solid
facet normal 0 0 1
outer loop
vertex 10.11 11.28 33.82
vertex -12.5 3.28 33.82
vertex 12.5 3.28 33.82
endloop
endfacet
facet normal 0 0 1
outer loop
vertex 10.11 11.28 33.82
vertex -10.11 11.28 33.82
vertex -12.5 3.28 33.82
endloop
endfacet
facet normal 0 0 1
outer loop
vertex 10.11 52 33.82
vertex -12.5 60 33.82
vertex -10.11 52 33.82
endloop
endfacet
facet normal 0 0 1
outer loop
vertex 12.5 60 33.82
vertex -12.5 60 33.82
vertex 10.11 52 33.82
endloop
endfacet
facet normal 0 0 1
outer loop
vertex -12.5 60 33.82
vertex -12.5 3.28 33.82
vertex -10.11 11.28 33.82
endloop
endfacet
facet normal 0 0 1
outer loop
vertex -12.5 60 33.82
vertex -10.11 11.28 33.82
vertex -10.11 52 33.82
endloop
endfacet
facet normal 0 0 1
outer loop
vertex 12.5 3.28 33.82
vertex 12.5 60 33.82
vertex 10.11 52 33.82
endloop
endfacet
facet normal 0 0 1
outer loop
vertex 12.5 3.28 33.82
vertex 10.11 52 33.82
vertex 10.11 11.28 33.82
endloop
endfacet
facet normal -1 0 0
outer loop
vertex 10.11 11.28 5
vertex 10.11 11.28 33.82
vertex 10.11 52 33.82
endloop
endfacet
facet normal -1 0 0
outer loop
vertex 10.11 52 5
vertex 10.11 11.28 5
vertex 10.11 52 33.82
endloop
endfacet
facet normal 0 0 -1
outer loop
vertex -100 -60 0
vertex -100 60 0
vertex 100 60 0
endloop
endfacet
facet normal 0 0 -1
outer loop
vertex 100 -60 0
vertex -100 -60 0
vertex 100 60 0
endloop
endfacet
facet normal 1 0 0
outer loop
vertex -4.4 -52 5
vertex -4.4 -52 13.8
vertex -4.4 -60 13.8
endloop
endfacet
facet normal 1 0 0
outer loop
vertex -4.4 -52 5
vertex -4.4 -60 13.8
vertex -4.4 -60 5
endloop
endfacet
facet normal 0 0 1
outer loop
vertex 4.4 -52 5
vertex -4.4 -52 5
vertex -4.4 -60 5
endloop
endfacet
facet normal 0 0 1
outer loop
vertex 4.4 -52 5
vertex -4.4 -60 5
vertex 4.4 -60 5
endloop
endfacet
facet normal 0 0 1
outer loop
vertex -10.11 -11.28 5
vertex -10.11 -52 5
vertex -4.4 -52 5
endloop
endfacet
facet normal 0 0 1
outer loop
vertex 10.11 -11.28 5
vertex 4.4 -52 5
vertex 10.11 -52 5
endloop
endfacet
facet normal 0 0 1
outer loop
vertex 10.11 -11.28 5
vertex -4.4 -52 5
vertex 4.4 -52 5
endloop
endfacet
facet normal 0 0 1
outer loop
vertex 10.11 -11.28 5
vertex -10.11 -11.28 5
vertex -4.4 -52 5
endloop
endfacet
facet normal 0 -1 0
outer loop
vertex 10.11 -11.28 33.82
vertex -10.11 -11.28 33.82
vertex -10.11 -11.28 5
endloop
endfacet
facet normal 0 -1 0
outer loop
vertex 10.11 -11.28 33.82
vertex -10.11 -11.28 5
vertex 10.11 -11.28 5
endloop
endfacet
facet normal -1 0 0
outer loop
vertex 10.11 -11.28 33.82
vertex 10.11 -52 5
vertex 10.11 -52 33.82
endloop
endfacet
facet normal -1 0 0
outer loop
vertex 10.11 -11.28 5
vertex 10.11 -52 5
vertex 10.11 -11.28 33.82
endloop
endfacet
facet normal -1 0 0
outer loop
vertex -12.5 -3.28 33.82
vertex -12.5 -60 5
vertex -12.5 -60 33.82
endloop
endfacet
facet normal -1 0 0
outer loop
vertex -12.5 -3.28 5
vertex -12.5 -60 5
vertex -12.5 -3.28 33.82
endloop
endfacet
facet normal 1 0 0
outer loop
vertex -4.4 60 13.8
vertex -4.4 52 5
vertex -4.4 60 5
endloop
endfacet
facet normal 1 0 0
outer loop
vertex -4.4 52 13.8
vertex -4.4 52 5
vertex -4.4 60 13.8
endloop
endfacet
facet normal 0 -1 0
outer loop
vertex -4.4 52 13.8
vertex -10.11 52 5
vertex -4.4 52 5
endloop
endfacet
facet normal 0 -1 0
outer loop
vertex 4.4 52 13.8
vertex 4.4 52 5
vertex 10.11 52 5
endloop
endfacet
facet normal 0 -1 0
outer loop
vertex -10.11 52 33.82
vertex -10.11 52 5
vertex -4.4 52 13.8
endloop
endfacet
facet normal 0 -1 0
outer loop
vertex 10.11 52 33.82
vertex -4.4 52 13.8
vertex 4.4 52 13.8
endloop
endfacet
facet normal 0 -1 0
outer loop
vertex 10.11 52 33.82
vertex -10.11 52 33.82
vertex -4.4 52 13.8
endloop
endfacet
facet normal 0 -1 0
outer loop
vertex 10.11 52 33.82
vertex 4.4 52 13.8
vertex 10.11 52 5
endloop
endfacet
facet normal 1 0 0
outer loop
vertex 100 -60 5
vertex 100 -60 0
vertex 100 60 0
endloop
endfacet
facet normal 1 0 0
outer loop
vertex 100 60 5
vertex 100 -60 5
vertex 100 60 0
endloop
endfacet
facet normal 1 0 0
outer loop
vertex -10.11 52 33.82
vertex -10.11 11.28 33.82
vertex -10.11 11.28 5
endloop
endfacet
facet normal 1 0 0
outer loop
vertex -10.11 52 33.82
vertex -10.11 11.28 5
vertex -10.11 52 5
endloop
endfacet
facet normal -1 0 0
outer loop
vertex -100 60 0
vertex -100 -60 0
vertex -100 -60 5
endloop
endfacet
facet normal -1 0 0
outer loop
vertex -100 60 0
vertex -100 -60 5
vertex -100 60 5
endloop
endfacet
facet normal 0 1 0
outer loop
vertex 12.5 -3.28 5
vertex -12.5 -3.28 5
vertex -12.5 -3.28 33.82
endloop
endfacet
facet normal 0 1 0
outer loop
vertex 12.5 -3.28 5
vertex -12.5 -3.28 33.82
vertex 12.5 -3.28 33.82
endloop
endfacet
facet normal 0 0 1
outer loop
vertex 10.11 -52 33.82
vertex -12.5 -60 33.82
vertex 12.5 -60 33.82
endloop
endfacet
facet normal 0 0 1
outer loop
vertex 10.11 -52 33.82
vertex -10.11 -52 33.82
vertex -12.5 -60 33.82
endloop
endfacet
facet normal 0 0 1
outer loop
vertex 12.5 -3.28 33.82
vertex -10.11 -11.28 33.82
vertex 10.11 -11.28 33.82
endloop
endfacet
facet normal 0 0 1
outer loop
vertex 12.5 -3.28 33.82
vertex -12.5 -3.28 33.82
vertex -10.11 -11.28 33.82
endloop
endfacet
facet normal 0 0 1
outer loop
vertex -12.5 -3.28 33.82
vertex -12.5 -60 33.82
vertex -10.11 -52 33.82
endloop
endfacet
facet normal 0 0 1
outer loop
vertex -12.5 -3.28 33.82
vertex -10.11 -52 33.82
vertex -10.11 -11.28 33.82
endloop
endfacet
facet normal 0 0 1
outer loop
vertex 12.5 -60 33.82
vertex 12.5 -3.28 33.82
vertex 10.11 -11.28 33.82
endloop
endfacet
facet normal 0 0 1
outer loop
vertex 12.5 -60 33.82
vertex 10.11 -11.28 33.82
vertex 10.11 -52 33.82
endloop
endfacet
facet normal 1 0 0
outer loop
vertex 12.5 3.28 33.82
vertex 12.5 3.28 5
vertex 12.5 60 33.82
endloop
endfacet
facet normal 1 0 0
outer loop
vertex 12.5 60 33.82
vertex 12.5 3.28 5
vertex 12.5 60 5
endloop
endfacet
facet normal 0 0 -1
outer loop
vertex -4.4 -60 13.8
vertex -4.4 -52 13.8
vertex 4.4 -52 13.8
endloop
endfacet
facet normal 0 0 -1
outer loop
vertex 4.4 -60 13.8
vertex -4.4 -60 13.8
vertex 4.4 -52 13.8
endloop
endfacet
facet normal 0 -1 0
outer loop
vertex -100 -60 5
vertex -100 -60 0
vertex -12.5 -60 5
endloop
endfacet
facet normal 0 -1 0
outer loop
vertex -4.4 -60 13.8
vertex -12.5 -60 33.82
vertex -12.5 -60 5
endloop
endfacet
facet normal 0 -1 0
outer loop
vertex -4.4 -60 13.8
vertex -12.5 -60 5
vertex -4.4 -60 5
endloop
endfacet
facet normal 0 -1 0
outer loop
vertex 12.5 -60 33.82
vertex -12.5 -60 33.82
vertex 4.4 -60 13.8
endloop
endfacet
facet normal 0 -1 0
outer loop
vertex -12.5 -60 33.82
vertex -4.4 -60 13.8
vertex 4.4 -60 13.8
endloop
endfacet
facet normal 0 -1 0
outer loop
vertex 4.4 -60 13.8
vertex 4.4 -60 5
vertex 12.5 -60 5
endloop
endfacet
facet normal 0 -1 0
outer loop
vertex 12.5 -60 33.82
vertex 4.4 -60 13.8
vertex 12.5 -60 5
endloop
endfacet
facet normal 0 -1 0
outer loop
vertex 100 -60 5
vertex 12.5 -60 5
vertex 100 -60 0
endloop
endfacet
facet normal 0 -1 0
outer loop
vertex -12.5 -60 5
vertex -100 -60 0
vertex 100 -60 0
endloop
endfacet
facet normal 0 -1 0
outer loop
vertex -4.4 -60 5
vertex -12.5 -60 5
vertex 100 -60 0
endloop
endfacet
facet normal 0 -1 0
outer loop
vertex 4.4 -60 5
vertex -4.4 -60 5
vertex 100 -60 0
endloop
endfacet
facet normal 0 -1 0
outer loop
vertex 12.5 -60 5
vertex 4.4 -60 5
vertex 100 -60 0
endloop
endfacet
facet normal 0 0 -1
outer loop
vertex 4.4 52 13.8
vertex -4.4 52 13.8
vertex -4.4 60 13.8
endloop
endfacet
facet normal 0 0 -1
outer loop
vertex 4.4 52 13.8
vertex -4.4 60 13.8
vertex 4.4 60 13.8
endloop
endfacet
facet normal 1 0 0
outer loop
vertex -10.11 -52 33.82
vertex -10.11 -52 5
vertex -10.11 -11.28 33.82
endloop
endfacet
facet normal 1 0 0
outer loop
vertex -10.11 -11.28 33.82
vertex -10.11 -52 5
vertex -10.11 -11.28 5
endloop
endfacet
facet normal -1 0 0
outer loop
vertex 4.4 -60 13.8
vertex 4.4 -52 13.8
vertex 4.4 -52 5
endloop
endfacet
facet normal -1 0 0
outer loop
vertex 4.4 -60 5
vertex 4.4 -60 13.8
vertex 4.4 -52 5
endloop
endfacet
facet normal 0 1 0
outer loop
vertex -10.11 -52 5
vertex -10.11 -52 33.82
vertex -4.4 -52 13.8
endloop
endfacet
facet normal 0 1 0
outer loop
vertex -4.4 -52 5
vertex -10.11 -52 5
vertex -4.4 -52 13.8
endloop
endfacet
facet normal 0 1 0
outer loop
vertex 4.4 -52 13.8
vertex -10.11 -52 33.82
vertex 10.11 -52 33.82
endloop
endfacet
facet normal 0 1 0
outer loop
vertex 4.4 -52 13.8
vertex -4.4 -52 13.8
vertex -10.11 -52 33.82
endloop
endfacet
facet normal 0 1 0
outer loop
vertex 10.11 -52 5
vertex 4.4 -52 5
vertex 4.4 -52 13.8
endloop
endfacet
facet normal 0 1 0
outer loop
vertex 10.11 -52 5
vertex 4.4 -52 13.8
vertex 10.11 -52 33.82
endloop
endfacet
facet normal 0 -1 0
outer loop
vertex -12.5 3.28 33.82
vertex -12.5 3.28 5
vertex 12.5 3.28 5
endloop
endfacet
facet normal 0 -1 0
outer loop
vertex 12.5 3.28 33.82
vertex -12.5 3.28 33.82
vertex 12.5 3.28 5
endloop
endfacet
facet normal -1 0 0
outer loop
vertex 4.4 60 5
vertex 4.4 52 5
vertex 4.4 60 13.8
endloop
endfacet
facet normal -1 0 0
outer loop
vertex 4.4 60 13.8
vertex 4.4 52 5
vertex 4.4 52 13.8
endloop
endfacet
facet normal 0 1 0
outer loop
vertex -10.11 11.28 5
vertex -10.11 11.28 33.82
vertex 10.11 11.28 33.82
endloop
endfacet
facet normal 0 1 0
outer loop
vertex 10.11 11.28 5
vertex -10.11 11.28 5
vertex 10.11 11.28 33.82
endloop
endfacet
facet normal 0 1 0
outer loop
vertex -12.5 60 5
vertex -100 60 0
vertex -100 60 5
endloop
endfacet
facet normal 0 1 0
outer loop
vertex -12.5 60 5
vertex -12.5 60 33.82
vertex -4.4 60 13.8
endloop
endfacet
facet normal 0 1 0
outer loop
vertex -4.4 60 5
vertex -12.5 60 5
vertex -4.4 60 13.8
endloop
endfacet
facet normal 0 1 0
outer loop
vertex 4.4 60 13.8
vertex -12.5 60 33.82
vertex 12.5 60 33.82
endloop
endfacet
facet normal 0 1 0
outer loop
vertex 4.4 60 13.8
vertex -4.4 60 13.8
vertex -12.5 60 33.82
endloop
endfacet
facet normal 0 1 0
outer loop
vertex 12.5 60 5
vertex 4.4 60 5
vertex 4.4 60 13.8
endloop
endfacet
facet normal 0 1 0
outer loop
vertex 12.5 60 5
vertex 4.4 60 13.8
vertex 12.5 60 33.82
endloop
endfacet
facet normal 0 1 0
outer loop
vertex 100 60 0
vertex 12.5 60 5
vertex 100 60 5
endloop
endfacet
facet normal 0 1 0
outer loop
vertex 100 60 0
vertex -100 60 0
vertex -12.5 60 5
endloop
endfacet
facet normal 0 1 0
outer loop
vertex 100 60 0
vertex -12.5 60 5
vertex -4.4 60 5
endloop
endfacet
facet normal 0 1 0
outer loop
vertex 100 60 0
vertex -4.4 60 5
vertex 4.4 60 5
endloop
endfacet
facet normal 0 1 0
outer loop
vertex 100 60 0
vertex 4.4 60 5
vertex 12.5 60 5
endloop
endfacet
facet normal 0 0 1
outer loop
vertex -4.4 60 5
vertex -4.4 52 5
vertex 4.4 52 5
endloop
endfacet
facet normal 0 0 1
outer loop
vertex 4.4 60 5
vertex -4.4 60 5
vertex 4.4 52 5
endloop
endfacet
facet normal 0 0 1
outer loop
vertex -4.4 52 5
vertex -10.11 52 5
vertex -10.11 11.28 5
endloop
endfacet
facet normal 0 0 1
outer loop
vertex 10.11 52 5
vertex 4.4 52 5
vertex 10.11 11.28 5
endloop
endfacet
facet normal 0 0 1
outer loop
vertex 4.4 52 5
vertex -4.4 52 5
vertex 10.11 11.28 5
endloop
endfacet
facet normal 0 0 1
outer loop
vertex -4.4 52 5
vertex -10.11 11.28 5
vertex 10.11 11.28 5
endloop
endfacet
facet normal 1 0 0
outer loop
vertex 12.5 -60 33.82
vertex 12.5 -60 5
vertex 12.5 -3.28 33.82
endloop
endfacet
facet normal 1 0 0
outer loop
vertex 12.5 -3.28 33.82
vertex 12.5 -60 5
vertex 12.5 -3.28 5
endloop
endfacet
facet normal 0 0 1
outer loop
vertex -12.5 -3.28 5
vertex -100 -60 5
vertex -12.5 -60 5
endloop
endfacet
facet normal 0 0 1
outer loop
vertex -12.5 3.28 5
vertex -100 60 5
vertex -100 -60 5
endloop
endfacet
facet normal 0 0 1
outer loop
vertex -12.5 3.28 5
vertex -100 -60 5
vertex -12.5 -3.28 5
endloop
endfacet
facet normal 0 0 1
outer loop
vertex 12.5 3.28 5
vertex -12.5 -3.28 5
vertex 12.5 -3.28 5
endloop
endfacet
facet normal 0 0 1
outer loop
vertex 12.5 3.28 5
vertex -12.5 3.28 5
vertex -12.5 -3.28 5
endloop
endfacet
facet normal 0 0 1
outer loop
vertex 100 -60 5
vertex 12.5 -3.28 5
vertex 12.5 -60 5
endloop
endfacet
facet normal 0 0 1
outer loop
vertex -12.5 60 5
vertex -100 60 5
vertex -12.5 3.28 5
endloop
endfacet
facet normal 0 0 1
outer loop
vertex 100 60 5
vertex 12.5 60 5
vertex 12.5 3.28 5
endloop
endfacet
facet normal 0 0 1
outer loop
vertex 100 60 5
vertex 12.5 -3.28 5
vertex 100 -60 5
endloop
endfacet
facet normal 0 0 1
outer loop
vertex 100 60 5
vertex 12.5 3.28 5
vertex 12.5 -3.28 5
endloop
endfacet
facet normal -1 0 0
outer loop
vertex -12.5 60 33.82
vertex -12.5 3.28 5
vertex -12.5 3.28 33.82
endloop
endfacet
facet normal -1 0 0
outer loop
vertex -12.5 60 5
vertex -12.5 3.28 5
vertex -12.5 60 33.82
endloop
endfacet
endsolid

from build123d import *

# Parameters (mm, degrees)
SKETCH1_W           = 200
SKETCH1_H           = 120
BOSS_EXTRUDE1_DEPTH = 5
SKETCH2_W           = 25
SKETCH2_H           = 56.72
BOSS_EXTRUDE2_DEPTH = 28.82
SKETCH3_W           = 20.22
SKETCH3_H           = 40.72
CUT_EXTRUDE1_DEPTH  = 28.82
SKETCH4_W           = 8.8
SKETCH4_H           = 8.8
CUT_EXTRUDE2_DEPTH  = 19.82
SKETCH5_W           = 8.8
SKETCH5_H           = 8.8
CUT_EXTRUDE3_DEPTH  = 19.82


with BuildPart() as part:
    # Sketch1 → Boss-Extrude1 (new body)
    with BuildSketch(Plane.XY):
        Rectangle(SKETCH1_W, SKETCH1_H)
    boss_extrude1 = extrude(amount=BOSS_EXTRUDE1_DEPTH)

    # Sketch2 → Boss-Extrude2 (add)
    with BuildSketch(Plane.XY.offset(5)):
        with Locations((0, 31.64)):
            Rectangle(SKETCH2_W, SKETCH2_H)
    boss_extrude2 = extrude(amount=BOSS_EXTRUDE2_DEPTH)

    # Sketch3 → Cut-Extrude1 (cut)
    with BuildSketch(Plane.XY.offset(33.82)):
        with Locations((0, 31.64)):
            Rectangle(SKETCH3_W, SKETCH3_H)
    cut_extrude1 = extrude(amount=-CUT_EXTRUDE1_DEPTH, mode=Mode.SUBTRACT)

    # Sketch4 → Cut-Extrude2 (cut)
    with BuildSketch(Plane.XZ.offset(-52)):
        with Locations((0, 9.4)):
            Rectangle(SKETCH4_W, SKETCH4_H)
    extrude(amount=-CUT_EXTRUDE2_DEPTH, mode=Mode.SUBTRACT)

    # Mirror1: Boss-Extrude1, Boss-Extrude2, Cut-Extrude1 across plane
    add(boss_extrude1.mirror(Plane.ZX))
    add(boss_extrude2.mirror(Plane.ZX))
    add(cut_extrude1.mirror(Plane.ZX), mode=Mode.SUBTRACT)

    # Sketch5 → Cut-Extrude3 (cut)
    with BuildSketch(Plane(origin=(0, -52, 0), x_dir=(1, 0, 0), z_dir=(0, 1, 0))):
        with Locations((0, -9.4)):
            Rectangle(SKETCH5_W, SKETCH5_H)
    extrude(amount=-CUT_EXTRUDE3_DEPTH, mode=Mode.SUBTRACT)


solid = part.part
